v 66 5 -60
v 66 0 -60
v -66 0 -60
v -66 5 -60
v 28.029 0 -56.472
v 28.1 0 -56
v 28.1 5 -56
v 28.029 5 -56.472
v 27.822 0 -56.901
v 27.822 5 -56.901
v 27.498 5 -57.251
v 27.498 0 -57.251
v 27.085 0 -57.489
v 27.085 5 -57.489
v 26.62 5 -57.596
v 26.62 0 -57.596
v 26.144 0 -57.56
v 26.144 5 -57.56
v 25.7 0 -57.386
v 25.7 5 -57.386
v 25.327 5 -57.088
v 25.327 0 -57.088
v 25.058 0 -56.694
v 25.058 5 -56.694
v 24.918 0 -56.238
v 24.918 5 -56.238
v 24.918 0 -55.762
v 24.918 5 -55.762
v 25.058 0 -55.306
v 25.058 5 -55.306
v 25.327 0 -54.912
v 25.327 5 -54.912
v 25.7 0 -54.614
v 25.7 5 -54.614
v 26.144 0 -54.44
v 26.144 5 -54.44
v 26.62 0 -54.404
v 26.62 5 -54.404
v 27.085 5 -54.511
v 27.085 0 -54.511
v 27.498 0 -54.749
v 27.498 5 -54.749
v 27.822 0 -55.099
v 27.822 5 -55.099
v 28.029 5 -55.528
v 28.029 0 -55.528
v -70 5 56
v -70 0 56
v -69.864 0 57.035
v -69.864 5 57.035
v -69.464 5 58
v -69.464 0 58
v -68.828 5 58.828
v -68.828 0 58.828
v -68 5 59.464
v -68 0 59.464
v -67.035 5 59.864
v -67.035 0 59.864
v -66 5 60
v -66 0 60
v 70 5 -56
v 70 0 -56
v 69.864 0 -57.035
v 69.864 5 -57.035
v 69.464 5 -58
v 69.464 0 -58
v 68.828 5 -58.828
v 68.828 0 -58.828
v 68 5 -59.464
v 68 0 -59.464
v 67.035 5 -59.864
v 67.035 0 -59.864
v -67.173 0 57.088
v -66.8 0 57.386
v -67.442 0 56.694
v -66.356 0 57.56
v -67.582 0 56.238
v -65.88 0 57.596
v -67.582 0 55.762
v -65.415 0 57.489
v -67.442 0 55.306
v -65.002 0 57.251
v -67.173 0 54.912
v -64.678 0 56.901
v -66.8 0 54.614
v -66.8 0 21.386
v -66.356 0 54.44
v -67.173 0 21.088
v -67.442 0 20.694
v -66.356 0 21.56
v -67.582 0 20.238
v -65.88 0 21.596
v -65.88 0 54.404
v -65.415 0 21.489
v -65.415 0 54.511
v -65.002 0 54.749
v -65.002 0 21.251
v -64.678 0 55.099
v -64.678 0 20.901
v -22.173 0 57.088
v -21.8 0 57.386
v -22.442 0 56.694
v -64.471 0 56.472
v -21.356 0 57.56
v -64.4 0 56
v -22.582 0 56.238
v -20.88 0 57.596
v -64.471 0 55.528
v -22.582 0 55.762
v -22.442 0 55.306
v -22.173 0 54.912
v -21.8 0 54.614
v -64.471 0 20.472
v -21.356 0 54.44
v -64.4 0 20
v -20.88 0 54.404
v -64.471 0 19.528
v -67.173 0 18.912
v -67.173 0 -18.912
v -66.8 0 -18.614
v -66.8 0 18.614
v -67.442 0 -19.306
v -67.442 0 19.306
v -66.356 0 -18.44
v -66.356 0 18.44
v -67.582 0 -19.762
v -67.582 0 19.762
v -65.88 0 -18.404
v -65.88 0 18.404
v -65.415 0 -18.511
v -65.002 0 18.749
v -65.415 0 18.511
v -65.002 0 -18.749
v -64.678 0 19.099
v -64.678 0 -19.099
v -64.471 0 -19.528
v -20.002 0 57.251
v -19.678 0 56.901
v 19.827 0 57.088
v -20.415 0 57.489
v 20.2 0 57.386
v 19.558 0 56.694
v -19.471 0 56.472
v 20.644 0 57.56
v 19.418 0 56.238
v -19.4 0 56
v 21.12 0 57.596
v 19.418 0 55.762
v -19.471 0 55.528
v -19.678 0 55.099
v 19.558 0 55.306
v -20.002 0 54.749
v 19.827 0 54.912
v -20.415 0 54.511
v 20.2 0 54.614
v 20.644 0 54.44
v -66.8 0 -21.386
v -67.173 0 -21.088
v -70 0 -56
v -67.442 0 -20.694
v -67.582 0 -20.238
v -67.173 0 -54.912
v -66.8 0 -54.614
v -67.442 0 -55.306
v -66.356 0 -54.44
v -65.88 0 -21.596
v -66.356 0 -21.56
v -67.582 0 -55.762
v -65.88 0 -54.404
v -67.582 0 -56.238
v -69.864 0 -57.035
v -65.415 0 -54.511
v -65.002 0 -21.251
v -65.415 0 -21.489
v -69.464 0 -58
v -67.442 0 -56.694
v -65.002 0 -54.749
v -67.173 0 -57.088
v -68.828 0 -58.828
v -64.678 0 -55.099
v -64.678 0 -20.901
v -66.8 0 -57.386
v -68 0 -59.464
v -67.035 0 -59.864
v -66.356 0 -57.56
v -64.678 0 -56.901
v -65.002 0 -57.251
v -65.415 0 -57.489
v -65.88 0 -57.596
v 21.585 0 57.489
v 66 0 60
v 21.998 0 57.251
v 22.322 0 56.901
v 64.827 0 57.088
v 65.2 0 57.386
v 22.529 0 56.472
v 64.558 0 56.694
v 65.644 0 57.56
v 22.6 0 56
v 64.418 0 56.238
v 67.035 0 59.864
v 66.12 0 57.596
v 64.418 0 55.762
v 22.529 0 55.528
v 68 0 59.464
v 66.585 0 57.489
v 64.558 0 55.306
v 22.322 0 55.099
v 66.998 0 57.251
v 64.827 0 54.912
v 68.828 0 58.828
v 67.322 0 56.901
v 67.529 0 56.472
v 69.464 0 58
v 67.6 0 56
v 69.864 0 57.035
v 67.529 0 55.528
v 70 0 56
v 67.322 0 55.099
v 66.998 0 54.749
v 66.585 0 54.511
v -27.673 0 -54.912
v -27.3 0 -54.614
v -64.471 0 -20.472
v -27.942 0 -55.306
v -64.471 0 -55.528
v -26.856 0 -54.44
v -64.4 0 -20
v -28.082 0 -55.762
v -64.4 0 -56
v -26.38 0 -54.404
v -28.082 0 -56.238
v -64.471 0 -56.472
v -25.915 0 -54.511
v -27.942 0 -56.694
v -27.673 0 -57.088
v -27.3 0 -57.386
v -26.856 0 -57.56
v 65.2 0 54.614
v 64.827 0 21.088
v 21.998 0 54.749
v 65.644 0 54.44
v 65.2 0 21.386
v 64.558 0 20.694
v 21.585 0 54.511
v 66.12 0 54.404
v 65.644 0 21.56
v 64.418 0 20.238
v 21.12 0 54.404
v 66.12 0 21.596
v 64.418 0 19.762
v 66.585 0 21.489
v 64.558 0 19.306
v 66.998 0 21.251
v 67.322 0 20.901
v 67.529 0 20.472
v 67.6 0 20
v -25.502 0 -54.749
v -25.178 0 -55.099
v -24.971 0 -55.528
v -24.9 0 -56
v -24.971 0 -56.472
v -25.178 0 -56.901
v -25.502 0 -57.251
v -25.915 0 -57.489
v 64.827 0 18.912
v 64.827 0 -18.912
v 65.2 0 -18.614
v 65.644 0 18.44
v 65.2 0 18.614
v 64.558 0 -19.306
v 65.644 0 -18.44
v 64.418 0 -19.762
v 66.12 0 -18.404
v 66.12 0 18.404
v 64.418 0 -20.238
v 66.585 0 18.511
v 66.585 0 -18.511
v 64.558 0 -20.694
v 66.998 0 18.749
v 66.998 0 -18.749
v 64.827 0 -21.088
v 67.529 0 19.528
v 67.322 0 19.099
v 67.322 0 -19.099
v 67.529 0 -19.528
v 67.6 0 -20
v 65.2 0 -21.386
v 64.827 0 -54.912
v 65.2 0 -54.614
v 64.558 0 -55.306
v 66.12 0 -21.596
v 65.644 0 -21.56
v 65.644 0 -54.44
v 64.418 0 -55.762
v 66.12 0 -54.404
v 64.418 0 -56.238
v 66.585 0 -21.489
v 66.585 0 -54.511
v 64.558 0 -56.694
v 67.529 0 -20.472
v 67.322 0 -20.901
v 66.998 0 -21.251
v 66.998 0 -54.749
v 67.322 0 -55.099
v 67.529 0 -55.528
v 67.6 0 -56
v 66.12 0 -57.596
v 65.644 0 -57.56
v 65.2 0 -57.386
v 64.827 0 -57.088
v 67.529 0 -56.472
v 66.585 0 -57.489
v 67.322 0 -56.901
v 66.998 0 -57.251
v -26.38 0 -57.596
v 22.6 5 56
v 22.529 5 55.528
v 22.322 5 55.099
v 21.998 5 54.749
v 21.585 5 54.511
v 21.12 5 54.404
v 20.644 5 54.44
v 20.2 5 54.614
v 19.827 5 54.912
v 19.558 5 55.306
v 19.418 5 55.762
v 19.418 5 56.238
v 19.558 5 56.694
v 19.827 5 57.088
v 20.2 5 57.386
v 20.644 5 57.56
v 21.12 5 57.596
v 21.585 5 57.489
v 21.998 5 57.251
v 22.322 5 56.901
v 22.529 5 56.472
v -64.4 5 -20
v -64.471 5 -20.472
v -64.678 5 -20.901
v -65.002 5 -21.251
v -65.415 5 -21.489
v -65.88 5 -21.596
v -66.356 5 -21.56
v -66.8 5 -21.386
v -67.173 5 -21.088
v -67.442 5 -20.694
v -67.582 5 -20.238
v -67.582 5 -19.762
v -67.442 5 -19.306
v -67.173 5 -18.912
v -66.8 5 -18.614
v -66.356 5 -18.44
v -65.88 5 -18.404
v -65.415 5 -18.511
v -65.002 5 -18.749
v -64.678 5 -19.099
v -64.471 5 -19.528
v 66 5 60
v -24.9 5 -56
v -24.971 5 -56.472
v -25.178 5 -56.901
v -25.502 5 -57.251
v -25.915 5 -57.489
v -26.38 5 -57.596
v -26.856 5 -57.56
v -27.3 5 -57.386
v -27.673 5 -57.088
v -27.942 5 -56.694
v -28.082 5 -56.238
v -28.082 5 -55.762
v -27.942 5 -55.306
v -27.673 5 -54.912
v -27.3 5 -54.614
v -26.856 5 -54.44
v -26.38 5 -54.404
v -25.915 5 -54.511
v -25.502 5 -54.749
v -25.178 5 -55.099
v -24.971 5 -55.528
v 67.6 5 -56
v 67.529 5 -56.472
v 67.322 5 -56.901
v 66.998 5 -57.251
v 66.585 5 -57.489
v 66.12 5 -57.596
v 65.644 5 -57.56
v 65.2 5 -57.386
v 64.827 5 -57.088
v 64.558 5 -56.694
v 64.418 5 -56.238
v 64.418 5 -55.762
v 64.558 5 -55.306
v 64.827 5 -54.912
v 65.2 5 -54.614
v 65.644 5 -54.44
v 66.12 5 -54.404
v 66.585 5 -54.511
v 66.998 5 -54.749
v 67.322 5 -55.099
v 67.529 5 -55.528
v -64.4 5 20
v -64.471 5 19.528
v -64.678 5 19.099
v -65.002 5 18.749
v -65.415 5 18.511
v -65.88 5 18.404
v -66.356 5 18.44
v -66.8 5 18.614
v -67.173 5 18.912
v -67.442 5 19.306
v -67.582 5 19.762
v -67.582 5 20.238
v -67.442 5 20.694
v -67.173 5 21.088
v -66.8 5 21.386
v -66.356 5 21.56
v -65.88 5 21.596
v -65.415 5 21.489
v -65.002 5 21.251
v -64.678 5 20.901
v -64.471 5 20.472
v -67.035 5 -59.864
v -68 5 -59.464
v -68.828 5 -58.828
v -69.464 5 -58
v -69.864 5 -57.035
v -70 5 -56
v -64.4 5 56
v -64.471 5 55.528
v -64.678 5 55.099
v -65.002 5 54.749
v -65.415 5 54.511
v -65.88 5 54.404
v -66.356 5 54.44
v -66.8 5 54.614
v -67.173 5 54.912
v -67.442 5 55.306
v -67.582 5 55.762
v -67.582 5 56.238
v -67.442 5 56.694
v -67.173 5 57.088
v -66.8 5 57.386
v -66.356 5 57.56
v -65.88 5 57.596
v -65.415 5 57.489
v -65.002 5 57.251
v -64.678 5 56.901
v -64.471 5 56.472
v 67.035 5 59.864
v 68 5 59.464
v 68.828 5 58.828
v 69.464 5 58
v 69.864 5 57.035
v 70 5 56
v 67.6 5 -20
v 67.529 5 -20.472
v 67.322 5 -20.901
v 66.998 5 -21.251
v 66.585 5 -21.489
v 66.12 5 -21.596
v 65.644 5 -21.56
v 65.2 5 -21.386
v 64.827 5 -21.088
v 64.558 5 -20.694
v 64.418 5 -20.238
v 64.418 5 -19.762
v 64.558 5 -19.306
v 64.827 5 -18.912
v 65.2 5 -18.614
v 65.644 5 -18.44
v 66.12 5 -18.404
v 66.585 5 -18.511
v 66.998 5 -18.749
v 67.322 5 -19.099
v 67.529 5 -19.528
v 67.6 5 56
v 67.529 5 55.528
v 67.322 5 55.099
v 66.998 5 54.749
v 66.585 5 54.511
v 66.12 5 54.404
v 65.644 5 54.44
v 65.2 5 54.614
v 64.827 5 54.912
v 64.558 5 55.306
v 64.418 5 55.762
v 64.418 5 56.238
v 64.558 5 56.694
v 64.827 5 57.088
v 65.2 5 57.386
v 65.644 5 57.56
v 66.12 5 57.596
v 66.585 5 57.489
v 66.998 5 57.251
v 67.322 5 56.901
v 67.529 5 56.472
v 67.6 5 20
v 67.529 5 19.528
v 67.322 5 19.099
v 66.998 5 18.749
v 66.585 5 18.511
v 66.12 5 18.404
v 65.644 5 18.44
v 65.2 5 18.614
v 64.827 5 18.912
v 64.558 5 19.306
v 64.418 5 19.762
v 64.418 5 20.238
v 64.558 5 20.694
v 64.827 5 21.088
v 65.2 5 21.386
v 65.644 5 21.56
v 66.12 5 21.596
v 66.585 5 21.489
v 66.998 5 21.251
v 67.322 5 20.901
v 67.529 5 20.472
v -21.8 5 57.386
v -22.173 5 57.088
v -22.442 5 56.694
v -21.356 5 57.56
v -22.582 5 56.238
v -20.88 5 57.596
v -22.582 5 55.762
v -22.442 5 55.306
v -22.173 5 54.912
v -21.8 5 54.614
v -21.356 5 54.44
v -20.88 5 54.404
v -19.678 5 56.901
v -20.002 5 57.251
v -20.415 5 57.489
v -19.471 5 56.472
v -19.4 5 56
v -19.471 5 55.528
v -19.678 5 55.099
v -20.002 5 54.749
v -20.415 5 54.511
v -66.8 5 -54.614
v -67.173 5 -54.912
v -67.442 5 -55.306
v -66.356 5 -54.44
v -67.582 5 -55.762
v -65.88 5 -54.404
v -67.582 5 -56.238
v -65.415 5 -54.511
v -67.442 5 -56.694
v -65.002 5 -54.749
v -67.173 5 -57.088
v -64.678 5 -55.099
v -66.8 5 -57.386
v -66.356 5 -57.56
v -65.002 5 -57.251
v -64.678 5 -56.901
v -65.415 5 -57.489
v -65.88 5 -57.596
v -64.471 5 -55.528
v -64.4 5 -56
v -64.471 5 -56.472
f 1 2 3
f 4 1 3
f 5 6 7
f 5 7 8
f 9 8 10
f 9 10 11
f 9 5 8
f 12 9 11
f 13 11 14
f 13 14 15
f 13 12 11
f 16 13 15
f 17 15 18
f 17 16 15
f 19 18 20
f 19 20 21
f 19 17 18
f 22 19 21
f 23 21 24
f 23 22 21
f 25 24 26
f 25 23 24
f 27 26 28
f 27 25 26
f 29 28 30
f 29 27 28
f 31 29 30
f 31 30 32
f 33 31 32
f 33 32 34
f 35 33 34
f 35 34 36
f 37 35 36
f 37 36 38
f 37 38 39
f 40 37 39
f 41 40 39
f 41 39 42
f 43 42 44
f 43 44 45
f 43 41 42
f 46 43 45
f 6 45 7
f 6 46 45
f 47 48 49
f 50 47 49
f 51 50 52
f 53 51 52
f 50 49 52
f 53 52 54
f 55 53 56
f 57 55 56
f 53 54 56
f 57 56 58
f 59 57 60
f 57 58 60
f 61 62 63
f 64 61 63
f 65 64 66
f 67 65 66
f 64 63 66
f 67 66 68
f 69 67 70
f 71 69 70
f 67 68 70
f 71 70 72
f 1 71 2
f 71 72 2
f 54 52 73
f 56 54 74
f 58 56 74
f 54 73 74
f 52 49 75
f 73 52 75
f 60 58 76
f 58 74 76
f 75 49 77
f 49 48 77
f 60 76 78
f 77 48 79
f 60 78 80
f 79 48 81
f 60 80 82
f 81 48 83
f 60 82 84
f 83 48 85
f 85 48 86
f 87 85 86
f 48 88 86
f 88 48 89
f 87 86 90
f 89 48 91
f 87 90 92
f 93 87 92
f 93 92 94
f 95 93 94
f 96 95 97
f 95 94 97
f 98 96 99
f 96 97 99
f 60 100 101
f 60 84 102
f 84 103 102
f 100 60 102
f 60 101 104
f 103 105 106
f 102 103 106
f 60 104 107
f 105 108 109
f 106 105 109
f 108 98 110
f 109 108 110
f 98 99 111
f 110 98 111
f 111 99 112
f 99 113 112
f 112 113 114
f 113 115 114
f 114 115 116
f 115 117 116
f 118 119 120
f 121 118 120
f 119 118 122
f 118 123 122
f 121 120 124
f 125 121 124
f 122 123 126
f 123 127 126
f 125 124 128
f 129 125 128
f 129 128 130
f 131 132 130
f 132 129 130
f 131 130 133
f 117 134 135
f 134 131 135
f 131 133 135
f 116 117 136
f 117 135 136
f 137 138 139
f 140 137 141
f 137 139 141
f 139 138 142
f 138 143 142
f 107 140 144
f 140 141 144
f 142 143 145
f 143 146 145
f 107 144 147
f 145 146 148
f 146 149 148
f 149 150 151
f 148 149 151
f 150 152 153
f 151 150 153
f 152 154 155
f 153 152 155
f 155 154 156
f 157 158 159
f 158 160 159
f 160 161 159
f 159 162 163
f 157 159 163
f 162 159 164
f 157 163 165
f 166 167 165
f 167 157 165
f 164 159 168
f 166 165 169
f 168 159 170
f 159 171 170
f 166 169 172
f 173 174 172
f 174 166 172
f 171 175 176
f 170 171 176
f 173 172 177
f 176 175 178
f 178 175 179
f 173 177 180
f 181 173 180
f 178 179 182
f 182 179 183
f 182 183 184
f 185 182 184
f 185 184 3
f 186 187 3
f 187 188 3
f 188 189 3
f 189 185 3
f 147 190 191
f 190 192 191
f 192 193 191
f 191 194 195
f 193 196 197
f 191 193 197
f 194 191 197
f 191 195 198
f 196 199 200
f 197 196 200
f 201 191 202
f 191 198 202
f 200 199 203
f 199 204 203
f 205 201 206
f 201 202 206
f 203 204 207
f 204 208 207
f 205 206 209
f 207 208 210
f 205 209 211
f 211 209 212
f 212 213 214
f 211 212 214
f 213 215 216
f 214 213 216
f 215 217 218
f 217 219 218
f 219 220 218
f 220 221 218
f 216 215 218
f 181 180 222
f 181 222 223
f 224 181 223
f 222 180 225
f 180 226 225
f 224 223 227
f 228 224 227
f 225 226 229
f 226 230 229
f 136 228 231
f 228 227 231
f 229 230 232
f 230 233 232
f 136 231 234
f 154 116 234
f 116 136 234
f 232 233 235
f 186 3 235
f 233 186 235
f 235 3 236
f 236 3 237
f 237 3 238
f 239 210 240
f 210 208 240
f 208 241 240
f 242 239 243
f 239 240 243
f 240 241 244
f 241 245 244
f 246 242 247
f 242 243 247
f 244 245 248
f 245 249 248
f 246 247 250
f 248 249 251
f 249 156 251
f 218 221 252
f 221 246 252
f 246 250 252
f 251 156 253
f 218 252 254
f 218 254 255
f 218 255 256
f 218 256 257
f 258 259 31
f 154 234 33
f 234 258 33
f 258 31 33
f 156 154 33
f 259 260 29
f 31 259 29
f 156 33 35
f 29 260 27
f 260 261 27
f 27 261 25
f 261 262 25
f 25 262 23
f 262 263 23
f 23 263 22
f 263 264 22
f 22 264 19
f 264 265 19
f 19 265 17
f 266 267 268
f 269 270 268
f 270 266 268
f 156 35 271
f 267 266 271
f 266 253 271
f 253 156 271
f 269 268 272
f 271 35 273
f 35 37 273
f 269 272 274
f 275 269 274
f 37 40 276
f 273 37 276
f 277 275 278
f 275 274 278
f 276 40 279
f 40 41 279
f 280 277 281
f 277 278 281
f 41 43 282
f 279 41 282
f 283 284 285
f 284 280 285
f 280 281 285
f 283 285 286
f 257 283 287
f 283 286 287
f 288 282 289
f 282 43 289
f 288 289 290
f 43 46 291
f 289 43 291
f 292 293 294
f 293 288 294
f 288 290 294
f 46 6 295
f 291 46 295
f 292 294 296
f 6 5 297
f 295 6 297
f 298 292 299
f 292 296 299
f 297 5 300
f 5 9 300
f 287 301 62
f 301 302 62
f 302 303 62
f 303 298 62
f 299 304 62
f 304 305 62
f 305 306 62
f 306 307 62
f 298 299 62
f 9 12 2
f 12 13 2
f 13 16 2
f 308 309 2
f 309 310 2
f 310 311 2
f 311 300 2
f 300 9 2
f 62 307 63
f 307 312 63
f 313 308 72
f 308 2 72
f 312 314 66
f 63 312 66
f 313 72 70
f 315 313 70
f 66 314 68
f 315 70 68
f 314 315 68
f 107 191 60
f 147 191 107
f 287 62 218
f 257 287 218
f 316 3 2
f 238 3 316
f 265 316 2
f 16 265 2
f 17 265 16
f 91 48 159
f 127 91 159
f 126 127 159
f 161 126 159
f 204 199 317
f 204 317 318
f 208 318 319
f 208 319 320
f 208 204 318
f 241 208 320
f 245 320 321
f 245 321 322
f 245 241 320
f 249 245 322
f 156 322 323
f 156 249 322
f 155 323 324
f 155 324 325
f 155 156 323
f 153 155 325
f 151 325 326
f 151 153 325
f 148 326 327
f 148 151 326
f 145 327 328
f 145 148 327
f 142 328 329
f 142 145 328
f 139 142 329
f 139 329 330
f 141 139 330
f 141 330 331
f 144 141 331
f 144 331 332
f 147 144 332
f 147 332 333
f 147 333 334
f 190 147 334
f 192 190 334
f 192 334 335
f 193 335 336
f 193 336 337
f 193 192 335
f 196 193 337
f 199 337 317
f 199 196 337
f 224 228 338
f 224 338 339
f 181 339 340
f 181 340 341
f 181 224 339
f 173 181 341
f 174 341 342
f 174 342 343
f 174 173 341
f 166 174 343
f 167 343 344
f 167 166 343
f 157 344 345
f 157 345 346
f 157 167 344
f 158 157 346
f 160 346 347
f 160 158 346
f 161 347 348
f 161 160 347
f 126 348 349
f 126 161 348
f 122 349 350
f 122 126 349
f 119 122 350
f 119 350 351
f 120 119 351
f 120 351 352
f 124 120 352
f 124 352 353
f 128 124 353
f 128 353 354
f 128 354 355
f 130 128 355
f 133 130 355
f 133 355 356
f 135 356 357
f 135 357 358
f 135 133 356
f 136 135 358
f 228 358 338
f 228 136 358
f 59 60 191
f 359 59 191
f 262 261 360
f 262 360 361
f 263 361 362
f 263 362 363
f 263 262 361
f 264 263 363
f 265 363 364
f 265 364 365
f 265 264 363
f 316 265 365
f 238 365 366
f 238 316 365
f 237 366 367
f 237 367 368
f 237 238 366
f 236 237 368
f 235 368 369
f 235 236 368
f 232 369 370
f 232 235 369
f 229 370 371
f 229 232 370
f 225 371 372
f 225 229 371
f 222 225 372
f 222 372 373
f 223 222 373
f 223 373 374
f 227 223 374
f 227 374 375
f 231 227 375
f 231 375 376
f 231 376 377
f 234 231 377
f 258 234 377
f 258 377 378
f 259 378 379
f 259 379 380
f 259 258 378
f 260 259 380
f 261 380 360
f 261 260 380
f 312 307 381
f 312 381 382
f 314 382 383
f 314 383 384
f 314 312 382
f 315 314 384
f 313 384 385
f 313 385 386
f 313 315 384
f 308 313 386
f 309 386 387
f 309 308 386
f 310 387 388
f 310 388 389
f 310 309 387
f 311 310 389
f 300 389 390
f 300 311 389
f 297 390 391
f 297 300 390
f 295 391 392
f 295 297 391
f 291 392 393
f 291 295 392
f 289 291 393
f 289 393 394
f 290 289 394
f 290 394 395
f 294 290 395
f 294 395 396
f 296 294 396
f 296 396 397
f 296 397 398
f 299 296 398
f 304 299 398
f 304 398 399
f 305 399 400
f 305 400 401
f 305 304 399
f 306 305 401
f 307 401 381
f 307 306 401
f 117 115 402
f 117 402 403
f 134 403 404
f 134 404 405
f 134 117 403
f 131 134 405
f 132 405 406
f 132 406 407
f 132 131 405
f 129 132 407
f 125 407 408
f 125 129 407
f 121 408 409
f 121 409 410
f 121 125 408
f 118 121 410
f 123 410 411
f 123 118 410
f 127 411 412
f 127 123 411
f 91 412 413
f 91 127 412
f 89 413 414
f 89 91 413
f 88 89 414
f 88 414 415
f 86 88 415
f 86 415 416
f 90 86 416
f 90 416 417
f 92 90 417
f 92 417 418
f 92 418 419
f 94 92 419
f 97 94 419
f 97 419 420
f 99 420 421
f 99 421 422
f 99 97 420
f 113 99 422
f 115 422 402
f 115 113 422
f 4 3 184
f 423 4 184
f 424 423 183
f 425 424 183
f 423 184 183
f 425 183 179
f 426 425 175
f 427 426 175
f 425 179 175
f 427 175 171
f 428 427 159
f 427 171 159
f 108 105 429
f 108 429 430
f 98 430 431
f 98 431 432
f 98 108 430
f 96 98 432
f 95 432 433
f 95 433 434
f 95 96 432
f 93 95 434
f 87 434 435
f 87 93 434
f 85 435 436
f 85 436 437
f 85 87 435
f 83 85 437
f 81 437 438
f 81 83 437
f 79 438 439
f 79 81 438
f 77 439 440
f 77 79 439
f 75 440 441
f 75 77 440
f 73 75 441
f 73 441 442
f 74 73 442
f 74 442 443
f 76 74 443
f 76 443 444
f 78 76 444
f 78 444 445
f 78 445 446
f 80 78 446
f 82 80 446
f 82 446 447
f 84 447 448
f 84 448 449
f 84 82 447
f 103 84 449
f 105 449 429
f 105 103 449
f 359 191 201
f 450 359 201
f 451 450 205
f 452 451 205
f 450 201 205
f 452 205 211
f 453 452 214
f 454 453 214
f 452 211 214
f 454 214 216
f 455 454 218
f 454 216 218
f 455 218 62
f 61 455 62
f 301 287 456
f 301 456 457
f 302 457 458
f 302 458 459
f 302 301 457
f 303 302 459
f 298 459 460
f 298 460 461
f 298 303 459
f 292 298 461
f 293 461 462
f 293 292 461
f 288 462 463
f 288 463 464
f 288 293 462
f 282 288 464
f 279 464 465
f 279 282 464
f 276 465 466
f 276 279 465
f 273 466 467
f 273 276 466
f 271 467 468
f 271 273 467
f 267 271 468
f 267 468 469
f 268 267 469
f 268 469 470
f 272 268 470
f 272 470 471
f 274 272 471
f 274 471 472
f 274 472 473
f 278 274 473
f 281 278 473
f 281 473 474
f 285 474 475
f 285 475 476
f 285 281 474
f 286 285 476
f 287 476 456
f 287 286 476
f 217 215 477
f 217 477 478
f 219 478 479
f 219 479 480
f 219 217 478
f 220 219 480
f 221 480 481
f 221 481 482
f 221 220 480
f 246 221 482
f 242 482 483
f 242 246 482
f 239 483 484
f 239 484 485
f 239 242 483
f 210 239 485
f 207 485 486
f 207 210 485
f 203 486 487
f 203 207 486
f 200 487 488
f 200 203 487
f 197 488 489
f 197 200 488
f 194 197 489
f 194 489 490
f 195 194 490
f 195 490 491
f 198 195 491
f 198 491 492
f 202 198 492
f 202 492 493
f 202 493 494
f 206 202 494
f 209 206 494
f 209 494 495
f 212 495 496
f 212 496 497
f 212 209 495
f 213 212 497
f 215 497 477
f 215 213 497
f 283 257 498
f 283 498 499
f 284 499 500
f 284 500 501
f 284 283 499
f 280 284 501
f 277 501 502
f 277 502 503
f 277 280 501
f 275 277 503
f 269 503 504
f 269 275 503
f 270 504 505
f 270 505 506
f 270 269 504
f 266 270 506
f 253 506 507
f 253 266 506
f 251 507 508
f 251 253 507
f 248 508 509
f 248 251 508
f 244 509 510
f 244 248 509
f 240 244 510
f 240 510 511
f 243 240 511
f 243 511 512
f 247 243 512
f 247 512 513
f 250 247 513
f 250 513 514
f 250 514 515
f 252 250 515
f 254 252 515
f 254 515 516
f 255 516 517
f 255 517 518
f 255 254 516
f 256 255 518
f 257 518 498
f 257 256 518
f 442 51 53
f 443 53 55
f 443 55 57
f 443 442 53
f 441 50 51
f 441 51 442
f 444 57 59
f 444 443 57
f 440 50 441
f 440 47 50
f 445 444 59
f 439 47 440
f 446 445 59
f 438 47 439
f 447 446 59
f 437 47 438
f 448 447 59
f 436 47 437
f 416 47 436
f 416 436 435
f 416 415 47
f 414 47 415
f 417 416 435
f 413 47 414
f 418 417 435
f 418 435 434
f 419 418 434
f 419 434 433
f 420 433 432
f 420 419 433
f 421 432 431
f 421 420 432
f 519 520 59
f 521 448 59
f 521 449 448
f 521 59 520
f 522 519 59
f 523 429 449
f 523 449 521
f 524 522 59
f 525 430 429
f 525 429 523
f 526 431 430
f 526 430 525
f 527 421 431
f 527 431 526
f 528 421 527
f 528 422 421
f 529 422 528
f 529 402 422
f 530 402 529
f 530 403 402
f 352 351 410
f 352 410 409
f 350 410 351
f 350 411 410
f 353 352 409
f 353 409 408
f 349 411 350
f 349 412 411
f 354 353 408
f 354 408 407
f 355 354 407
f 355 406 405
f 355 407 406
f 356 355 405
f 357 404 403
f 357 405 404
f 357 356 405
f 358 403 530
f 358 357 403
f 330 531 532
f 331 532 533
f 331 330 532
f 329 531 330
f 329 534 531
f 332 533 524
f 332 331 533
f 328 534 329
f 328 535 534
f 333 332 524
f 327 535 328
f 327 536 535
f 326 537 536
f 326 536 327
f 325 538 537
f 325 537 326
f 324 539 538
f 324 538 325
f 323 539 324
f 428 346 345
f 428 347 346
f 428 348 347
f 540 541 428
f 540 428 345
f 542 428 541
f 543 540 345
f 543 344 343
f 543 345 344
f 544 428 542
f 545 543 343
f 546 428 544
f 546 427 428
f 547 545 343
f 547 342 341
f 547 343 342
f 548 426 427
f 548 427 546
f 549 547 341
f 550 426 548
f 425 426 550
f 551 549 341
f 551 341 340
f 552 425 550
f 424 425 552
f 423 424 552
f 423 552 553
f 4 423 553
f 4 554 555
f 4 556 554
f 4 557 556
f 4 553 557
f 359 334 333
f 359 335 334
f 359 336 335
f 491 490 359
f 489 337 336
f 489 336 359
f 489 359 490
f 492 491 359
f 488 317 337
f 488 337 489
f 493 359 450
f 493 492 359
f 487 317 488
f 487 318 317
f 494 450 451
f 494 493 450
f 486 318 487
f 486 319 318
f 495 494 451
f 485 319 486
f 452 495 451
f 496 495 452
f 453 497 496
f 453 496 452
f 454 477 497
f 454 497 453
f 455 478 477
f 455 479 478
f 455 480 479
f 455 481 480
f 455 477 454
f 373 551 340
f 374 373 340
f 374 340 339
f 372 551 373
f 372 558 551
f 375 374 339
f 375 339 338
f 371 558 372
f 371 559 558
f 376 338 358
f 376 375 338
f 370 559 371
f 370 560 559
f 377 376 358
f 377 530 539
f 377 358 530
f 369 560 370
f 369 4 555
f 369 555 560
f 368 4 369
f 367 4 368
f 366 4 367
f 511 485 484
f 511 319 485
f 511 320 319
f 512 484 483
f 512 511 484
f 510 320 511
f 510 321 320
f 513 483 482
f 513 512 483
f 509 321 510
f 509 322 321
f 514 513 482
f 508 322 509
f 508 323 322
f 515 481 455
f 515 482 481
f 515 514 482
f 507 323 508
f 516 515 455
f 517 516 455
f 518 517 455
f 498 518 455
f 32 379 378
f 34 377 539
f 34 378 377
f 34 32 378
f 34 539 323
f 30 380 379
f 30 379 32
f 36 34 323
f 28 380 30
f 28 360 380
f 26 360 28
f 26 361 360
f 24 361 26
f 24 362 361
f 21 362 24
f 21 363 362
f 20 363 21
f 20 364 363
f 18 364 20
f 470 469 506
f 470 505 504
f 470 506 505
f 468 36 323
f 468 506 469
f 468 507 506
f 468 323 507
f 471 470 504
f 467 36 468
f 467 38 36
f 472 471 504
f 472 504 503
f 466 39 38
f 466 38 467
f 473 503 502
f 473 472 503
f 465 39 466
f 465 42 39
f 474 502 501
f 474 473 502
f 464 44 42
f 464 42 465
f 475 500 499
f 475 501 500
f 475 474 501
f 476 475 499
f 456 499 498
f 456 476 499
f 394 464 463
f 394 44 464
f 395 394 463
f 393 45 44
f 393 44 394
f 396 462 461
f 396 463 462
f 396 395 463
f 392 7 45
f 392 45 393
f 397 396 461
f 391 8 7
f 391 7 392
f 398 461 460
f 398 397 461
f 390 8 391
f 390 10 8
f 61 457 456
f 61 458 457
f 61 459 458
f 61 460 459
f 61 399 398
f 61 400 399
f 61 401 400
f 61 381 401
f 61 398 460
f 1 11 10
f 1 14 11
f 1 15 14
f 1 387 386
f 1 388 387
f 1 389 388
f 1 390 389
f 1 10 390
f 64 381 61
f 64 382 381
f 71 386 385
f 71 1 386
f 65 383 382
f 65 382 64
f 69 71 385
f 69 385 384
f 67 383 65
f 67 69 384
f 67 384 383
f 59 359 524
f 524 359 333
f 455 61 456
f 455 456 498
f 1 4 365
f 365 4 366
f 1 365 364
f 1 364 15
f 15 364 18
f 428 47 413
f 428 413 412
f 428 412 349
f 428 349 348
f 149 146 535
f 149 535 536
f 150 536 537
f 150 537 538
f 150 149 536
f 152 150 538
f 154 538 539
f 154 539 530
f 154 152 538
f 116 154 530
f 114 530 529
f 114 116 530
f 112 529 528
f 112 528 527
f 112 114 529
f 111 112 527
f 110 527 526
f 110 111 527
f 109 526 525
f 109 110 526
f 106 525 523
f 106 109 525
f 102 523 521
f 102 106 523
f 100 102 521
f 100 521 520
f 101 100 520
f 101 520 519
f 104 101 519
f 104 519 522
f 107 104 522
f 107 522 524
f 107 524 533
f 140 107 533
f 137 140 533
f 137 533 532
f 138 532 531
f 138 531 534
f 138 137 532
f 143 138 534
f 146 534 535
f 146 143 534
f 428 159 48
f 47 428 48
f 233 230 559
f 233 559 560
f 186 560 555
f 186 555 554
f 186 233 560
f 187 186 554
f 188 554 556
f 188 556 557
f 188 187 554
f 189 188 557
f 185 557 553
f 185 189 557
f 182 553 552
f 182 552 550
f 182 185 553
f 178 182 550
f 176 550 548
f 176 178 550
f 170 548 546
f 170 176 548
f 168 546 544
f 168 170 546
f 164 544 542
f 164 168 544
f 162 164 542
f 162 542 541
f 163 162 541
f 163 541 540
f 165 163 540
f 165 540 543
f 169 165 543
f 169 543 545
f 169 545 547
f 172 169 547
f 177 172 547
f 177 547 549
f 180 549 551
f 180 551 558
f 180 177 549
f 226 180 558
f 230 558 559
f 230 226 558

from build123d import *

# Parameters (mm, degrees)
SKETCH1_R           = 1.6
BOSS_EXTRUDE1_DEPTH = 5


with BuildPart() as part:
    # Sketch1 → Boss-Extrude1 (new body)
    with BuildSketch(Plane(origin=(0, 0, 0), x_dir=(1, 0, 0), z_dir=(0, 1, 0))):
        with BuildLine():
            Line((-66, -60), (66, -60))
            ThreePointArc((66, -60), (68.828427125, -58.828427125), (70, -56))
            Line((70, -56), (70, 56))
            ThreePointArc((70, 56), (68.828427125, 58.828427125), (66, 60))
            Line((66, 60), (-66, 60))
            ThreePointArc((-66, 60), (-68.828427125, 58.828427125), (-70, 56))
            Line((-70, 56), (-70, -56))
            ThreePointArc((-70, -56), (-68.828427125, -58.828427125), (-66, -60))
        make_face()
        with Locations((-66, 56)):
            Circle(SKETCH1_R, mode=Mode.SUBTRACT)
        with Locations((-66, -56)):
            Circle(SKETCH1_R, mode=Mode.SUBTRACT)
        with Locations((66, -56)):
            Circle(SKETCH1_R, mode=Mode.SUBTRACT)
        with Locations((66, 56)):
            Circle(SKETCH1_R, mode=Mode.SUBTRACT)
        with Locations((-66, -20)):
            Circle(SKETCH1_R, mode=Mode.SUBTRACT)
        with Locations((66, -20)):
            Circle(SKETCH1_R, mode=Mode.SUBTRACT)
        with Locations((-66, 20)):
            Circle(SKETCH1_R, mode=Mode.SUBTRACT)
        with Locations((66, 20)):
            Circle(SKETCH1_R, mode=Mode.SUBTRACT)
        with Locations((-21, -56)):
            Circle(SKETCH1_R, mode=Mode.SUBTRACT)
        with Locations((21, -56)):
            Circle(SKETCH1_R, mode=Mode.SUBTRACT)
        with Locations((-26.5, 56)):
            Circle(SKETCH1_R, mode=Mode.SUBTRACT)
        with Locations((26.5, 56)):
            Circle(SKETCH1_R, mode=Mode.SUBTRACT)
    extrude(amount=BOSS_EXTRUDE1_DEPTH)


solid = part.part
